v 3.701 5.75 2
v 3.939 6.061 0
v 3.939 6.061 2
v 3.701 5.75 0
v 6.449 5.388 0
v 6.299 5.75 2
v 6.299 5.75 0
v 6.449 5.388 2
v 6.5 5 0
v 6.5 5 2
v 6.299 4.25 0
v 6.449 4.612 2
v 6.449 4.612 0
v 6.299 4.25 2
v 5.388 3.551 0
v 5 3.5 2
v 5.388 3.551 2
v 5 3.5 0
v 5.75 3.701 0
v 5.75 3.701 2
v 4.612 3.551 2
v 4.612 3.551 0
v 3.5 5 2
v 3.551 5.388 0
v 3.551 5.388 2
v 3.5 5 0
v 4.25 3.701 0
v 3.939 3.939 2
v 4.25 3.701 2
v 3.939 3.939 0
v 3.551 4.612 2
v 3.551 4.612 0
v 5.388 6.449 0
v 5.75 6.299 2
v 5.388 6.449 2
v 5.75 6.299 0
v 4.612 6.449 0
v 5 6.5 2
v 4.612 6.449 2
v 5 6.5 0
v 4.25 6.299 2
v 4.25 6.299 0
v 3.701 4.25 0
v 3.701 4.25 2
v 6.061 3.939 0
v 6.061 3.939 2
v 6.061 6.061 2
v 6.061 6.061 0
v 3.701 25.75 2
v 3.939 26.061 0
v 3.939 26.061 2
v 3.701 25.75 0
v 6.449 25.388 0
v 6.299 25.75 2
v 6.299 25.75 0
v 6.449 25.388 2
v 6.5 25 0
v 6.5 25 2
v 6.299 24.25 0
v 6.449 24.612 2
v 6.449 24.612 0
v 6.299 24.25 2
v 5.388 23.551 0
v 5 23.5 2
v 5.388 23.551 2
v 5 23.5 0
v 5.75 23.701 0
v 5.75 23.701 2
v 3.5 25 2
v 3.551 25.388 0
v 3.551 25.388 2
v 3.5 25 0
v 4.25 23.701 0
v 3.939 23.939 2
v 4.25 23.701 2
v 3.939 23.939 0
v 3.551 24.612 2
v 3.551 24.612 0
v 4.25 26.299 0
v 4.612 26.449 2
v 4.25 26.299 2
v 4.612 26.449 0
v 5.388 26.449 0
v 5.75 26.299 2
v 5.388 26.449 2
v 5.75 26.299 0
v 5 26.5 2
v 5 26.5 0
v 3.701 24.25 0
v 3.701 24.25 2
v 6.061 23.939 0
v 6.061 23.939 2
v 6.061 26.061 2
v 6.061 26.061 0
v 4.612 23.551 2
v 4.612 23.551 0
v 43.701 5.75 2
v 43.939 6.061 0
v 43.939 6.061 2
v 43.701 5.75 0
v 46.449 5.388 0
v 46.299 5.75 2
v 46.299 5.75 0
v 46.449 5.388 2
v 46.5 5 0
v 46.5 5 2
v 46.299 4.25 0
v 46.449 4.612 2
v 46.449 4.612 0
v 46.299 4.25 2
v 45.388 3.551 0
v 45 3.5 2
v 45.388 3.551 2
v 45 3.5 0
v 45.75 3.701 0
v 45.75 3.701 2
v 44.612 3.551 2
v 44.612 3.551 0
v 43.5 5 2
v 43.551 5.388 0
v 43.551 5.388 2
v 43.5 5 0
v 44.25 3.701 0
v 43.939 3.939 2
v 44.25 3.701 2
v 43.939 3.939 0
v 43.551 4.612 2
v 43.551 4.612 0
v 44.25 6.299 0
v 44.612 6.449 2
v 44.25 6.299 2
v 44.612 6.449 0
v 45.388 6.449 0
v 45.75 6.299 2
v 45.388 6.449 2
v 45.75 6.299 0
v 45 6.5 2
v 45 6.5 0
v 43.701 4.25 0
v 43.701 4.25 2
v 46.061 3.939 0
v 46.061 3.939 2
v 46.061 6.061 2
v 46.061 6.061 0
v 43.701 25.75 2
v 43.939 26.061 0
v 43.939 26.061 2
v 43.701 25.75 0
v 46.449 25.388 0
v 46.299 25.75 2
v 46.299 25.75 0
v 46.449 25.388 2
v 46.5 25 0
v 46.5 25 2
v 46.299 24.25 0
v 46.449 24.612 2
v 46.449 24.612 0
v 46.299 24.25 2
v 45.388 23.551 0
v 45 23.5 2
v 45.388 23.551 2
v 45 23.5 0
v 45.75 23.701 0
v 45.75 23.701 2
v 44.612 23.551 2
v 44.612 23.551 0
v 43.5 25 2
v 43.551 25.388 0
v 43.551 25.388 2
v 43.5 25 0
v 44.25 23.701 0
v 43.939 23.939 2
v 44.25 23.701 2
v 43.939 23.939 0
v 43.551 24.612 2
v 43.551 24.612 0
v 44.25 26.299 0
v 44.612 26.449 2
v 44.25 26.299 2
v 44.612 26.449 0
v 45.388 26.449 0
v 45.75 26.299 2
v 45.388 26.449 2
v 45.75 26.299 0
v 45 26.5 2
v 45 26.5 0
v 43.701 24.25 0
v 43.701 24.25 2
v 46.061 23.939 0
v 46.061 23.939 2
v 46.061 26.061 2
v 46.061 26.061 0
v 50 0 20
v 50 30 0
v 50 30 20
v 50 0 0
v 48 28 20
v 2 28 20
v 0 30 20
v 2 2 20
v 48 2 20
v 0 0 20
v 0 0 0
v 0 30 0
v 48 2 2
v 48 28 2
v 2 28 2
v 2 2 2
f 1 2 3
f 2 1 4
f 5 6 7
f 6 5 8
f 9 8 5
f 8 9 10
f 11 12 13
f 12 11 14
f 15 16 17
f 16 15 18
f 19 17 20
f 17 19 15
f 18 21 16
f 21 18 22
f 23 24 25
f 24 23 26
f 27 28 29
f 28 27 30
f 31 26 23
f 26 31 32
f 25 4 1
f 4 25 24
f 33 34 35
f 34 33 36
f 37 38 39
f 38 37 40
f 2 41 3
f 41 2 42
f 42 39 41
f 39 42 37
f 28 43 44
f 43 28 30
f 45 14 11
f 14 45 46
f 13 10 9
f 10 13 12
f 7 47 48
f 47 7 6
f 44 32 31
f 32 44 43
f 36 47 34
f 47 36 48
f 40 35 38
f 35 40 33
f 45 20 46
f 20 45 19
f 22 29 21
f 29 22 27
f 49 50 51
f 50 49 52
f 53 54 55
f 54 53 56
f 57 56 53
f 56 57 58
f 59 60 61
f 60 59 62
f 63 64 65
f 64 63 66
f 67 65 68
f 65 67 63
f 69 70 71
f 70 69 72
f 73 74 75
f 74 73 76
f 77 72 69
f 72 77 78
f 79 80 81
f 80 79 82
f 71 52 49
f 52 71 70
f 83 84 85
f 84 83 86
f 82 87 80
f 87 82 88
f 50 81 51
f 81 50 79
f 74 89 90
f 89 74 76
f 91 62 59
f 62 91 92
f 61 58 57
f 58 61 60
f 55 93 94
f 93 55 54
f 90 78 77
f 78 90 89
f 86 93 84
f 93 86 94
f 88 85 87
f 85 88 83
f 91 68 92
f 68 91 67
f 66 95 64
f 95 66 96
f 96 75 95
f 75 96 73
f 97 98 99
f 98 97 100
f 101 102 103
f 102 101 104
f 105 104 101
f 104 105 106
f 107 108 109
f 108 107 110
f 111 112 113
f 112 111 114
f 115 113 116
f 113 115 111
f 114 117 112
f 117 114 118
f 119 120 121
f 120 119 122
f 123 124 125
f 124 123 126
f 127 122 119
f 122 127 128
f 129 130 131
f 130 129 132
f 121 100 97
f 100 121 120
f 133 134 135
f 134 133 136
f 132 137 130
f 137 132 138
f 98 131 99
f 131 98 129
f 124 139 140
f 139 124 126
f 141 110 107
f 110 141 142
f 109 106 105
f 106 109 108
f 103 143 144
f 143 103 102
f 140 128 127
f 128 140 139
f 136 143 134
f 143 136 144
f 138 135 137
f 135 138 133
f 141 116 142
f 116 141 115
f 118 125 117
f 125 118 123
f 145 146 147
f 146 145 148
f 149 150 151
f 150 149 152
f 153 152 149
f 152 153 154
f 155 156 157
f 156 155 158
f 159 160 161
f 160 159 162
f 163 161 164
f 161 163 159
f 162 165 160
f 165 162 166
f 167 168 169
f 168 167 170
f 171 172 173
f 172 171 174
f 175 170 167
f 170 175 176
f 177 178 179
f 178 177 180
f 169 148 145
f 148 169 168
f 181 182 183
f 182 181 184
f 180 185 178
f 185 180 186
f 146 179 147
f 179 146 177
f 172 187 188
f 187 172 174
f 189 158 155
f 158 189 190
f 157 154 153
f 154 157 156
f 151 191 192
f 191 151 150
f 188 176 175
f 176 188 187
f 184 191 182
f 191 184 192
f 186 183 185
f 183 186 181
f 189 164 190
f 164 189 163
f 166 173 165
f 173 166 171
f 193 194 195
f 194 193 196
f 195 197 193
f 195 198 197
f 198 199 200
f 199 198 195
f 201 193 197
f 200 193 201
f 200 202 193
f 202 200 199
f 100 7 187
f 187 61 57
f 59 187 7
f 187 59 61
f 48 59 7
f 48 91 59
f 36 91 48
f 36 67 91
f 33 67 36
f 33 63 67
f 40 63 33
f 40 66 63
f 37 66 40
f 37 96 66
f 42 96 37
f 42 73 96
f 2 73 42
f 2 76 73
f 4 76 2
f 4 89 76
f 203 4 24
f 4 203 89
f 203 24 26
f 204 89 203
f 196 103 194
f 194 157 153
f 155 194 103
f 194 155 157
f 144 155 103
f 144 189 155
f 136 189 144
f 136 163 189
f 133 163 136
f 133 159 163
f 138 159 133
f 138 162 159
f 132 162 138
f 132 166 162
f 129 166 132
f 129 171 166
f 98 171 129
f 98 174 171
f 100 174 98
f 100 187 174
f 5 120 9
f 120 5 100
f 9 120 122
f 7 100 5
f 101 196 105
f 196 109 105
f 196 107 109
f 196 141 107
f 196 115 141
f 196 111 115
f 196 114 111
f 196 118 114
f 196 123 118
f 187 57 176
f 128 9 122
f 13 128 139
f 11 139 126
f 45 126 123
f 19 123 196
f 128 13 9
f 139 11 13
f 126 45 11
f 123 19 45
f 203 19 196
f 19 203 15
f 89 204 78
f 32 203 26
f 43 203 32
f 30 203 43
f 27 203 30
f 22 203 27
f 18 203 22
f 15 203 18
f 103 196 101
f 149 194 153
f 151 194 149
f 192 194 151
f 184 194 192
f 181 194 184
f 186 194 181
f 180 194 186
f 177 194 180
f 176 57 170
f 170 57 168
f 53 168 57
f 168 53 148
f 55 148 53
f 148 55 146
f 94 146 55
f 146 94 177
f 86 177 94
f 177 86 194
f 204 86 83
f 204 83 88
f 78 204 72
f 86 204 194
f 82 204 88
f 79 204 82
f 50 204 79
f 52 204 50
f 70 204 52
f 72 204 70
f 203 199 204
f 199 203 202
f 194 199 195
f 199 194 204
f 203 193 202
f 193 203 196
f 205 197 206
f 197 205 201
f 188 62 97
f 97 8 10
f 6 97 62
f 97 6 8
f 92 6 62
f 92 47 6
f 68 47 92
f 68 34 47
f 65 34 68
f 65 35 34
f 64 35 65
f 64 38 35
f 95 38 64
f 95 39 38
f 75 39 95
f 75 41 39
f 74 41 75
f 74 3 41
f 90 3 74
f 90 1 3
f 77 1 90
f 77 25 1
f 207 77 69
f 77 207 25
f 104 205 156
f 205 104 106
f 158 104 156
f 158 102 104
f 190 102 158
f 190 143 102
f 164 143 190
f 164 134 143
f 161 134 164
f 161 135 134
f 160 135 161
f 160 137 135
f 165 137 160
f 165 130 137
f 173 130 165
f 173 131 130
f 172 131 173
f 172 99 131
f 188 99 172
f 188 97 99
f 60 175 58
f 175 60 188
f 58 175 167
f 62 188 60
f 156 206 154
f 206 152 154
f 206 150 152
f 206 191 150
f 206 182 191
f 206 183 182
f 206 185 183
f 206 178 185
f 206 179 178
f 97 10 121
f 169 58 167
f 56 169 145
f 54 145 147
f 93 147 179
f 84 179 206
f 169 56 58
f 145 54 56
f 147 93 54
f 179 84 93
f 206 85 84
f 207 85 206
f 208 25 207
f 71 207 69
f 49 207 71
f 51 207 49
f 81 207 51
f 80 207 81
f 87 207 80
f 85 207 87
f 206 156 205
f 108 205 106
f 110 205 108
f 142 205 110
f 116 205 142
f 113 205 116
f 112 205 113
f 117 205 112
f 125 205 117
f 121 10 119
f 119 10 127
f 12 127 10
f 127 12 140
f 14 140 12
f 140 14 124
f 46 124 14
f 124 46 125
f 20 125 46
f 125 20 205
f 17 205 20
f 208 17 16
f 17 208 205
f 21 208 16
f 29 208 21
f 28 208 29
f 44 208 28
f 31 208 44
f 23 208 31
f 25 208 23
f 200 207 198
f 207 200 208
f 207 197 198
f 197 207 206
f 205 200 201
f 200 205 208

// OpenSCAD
// Parametrisk teknisk boks med skruehull i hjørnene
lengde = 50;
bredde = 30;
hoyde = 20;
vegg_tykkelse = 2;
skrue_diameter = 3;
skrue_avstand = 5;

module teknisk_boks() {
    difference() {
        cube([lengde, bredde, hoyde]);                     // Ytre boks
        translate([vegg_tykkelse, vegg_tykkelse, vegg_tykkelse])
            cube([lengde - 2*vegg_tykkelse,
                  bredde - 2*vegg_tykkelse,
                  hoyde]);                                  // Indre hulrom
        for (x = [skrue_avstand, lengde - skrue_avstand])
            for (y = [skrue_avstand, bredde - skrue_avstand])
                translate([x, y, -1])
                    cylinder(h=vegg_tykkelse + 2, r=skrue_diameter/2, $fn=24);
    }
}

teknisk_boks();
